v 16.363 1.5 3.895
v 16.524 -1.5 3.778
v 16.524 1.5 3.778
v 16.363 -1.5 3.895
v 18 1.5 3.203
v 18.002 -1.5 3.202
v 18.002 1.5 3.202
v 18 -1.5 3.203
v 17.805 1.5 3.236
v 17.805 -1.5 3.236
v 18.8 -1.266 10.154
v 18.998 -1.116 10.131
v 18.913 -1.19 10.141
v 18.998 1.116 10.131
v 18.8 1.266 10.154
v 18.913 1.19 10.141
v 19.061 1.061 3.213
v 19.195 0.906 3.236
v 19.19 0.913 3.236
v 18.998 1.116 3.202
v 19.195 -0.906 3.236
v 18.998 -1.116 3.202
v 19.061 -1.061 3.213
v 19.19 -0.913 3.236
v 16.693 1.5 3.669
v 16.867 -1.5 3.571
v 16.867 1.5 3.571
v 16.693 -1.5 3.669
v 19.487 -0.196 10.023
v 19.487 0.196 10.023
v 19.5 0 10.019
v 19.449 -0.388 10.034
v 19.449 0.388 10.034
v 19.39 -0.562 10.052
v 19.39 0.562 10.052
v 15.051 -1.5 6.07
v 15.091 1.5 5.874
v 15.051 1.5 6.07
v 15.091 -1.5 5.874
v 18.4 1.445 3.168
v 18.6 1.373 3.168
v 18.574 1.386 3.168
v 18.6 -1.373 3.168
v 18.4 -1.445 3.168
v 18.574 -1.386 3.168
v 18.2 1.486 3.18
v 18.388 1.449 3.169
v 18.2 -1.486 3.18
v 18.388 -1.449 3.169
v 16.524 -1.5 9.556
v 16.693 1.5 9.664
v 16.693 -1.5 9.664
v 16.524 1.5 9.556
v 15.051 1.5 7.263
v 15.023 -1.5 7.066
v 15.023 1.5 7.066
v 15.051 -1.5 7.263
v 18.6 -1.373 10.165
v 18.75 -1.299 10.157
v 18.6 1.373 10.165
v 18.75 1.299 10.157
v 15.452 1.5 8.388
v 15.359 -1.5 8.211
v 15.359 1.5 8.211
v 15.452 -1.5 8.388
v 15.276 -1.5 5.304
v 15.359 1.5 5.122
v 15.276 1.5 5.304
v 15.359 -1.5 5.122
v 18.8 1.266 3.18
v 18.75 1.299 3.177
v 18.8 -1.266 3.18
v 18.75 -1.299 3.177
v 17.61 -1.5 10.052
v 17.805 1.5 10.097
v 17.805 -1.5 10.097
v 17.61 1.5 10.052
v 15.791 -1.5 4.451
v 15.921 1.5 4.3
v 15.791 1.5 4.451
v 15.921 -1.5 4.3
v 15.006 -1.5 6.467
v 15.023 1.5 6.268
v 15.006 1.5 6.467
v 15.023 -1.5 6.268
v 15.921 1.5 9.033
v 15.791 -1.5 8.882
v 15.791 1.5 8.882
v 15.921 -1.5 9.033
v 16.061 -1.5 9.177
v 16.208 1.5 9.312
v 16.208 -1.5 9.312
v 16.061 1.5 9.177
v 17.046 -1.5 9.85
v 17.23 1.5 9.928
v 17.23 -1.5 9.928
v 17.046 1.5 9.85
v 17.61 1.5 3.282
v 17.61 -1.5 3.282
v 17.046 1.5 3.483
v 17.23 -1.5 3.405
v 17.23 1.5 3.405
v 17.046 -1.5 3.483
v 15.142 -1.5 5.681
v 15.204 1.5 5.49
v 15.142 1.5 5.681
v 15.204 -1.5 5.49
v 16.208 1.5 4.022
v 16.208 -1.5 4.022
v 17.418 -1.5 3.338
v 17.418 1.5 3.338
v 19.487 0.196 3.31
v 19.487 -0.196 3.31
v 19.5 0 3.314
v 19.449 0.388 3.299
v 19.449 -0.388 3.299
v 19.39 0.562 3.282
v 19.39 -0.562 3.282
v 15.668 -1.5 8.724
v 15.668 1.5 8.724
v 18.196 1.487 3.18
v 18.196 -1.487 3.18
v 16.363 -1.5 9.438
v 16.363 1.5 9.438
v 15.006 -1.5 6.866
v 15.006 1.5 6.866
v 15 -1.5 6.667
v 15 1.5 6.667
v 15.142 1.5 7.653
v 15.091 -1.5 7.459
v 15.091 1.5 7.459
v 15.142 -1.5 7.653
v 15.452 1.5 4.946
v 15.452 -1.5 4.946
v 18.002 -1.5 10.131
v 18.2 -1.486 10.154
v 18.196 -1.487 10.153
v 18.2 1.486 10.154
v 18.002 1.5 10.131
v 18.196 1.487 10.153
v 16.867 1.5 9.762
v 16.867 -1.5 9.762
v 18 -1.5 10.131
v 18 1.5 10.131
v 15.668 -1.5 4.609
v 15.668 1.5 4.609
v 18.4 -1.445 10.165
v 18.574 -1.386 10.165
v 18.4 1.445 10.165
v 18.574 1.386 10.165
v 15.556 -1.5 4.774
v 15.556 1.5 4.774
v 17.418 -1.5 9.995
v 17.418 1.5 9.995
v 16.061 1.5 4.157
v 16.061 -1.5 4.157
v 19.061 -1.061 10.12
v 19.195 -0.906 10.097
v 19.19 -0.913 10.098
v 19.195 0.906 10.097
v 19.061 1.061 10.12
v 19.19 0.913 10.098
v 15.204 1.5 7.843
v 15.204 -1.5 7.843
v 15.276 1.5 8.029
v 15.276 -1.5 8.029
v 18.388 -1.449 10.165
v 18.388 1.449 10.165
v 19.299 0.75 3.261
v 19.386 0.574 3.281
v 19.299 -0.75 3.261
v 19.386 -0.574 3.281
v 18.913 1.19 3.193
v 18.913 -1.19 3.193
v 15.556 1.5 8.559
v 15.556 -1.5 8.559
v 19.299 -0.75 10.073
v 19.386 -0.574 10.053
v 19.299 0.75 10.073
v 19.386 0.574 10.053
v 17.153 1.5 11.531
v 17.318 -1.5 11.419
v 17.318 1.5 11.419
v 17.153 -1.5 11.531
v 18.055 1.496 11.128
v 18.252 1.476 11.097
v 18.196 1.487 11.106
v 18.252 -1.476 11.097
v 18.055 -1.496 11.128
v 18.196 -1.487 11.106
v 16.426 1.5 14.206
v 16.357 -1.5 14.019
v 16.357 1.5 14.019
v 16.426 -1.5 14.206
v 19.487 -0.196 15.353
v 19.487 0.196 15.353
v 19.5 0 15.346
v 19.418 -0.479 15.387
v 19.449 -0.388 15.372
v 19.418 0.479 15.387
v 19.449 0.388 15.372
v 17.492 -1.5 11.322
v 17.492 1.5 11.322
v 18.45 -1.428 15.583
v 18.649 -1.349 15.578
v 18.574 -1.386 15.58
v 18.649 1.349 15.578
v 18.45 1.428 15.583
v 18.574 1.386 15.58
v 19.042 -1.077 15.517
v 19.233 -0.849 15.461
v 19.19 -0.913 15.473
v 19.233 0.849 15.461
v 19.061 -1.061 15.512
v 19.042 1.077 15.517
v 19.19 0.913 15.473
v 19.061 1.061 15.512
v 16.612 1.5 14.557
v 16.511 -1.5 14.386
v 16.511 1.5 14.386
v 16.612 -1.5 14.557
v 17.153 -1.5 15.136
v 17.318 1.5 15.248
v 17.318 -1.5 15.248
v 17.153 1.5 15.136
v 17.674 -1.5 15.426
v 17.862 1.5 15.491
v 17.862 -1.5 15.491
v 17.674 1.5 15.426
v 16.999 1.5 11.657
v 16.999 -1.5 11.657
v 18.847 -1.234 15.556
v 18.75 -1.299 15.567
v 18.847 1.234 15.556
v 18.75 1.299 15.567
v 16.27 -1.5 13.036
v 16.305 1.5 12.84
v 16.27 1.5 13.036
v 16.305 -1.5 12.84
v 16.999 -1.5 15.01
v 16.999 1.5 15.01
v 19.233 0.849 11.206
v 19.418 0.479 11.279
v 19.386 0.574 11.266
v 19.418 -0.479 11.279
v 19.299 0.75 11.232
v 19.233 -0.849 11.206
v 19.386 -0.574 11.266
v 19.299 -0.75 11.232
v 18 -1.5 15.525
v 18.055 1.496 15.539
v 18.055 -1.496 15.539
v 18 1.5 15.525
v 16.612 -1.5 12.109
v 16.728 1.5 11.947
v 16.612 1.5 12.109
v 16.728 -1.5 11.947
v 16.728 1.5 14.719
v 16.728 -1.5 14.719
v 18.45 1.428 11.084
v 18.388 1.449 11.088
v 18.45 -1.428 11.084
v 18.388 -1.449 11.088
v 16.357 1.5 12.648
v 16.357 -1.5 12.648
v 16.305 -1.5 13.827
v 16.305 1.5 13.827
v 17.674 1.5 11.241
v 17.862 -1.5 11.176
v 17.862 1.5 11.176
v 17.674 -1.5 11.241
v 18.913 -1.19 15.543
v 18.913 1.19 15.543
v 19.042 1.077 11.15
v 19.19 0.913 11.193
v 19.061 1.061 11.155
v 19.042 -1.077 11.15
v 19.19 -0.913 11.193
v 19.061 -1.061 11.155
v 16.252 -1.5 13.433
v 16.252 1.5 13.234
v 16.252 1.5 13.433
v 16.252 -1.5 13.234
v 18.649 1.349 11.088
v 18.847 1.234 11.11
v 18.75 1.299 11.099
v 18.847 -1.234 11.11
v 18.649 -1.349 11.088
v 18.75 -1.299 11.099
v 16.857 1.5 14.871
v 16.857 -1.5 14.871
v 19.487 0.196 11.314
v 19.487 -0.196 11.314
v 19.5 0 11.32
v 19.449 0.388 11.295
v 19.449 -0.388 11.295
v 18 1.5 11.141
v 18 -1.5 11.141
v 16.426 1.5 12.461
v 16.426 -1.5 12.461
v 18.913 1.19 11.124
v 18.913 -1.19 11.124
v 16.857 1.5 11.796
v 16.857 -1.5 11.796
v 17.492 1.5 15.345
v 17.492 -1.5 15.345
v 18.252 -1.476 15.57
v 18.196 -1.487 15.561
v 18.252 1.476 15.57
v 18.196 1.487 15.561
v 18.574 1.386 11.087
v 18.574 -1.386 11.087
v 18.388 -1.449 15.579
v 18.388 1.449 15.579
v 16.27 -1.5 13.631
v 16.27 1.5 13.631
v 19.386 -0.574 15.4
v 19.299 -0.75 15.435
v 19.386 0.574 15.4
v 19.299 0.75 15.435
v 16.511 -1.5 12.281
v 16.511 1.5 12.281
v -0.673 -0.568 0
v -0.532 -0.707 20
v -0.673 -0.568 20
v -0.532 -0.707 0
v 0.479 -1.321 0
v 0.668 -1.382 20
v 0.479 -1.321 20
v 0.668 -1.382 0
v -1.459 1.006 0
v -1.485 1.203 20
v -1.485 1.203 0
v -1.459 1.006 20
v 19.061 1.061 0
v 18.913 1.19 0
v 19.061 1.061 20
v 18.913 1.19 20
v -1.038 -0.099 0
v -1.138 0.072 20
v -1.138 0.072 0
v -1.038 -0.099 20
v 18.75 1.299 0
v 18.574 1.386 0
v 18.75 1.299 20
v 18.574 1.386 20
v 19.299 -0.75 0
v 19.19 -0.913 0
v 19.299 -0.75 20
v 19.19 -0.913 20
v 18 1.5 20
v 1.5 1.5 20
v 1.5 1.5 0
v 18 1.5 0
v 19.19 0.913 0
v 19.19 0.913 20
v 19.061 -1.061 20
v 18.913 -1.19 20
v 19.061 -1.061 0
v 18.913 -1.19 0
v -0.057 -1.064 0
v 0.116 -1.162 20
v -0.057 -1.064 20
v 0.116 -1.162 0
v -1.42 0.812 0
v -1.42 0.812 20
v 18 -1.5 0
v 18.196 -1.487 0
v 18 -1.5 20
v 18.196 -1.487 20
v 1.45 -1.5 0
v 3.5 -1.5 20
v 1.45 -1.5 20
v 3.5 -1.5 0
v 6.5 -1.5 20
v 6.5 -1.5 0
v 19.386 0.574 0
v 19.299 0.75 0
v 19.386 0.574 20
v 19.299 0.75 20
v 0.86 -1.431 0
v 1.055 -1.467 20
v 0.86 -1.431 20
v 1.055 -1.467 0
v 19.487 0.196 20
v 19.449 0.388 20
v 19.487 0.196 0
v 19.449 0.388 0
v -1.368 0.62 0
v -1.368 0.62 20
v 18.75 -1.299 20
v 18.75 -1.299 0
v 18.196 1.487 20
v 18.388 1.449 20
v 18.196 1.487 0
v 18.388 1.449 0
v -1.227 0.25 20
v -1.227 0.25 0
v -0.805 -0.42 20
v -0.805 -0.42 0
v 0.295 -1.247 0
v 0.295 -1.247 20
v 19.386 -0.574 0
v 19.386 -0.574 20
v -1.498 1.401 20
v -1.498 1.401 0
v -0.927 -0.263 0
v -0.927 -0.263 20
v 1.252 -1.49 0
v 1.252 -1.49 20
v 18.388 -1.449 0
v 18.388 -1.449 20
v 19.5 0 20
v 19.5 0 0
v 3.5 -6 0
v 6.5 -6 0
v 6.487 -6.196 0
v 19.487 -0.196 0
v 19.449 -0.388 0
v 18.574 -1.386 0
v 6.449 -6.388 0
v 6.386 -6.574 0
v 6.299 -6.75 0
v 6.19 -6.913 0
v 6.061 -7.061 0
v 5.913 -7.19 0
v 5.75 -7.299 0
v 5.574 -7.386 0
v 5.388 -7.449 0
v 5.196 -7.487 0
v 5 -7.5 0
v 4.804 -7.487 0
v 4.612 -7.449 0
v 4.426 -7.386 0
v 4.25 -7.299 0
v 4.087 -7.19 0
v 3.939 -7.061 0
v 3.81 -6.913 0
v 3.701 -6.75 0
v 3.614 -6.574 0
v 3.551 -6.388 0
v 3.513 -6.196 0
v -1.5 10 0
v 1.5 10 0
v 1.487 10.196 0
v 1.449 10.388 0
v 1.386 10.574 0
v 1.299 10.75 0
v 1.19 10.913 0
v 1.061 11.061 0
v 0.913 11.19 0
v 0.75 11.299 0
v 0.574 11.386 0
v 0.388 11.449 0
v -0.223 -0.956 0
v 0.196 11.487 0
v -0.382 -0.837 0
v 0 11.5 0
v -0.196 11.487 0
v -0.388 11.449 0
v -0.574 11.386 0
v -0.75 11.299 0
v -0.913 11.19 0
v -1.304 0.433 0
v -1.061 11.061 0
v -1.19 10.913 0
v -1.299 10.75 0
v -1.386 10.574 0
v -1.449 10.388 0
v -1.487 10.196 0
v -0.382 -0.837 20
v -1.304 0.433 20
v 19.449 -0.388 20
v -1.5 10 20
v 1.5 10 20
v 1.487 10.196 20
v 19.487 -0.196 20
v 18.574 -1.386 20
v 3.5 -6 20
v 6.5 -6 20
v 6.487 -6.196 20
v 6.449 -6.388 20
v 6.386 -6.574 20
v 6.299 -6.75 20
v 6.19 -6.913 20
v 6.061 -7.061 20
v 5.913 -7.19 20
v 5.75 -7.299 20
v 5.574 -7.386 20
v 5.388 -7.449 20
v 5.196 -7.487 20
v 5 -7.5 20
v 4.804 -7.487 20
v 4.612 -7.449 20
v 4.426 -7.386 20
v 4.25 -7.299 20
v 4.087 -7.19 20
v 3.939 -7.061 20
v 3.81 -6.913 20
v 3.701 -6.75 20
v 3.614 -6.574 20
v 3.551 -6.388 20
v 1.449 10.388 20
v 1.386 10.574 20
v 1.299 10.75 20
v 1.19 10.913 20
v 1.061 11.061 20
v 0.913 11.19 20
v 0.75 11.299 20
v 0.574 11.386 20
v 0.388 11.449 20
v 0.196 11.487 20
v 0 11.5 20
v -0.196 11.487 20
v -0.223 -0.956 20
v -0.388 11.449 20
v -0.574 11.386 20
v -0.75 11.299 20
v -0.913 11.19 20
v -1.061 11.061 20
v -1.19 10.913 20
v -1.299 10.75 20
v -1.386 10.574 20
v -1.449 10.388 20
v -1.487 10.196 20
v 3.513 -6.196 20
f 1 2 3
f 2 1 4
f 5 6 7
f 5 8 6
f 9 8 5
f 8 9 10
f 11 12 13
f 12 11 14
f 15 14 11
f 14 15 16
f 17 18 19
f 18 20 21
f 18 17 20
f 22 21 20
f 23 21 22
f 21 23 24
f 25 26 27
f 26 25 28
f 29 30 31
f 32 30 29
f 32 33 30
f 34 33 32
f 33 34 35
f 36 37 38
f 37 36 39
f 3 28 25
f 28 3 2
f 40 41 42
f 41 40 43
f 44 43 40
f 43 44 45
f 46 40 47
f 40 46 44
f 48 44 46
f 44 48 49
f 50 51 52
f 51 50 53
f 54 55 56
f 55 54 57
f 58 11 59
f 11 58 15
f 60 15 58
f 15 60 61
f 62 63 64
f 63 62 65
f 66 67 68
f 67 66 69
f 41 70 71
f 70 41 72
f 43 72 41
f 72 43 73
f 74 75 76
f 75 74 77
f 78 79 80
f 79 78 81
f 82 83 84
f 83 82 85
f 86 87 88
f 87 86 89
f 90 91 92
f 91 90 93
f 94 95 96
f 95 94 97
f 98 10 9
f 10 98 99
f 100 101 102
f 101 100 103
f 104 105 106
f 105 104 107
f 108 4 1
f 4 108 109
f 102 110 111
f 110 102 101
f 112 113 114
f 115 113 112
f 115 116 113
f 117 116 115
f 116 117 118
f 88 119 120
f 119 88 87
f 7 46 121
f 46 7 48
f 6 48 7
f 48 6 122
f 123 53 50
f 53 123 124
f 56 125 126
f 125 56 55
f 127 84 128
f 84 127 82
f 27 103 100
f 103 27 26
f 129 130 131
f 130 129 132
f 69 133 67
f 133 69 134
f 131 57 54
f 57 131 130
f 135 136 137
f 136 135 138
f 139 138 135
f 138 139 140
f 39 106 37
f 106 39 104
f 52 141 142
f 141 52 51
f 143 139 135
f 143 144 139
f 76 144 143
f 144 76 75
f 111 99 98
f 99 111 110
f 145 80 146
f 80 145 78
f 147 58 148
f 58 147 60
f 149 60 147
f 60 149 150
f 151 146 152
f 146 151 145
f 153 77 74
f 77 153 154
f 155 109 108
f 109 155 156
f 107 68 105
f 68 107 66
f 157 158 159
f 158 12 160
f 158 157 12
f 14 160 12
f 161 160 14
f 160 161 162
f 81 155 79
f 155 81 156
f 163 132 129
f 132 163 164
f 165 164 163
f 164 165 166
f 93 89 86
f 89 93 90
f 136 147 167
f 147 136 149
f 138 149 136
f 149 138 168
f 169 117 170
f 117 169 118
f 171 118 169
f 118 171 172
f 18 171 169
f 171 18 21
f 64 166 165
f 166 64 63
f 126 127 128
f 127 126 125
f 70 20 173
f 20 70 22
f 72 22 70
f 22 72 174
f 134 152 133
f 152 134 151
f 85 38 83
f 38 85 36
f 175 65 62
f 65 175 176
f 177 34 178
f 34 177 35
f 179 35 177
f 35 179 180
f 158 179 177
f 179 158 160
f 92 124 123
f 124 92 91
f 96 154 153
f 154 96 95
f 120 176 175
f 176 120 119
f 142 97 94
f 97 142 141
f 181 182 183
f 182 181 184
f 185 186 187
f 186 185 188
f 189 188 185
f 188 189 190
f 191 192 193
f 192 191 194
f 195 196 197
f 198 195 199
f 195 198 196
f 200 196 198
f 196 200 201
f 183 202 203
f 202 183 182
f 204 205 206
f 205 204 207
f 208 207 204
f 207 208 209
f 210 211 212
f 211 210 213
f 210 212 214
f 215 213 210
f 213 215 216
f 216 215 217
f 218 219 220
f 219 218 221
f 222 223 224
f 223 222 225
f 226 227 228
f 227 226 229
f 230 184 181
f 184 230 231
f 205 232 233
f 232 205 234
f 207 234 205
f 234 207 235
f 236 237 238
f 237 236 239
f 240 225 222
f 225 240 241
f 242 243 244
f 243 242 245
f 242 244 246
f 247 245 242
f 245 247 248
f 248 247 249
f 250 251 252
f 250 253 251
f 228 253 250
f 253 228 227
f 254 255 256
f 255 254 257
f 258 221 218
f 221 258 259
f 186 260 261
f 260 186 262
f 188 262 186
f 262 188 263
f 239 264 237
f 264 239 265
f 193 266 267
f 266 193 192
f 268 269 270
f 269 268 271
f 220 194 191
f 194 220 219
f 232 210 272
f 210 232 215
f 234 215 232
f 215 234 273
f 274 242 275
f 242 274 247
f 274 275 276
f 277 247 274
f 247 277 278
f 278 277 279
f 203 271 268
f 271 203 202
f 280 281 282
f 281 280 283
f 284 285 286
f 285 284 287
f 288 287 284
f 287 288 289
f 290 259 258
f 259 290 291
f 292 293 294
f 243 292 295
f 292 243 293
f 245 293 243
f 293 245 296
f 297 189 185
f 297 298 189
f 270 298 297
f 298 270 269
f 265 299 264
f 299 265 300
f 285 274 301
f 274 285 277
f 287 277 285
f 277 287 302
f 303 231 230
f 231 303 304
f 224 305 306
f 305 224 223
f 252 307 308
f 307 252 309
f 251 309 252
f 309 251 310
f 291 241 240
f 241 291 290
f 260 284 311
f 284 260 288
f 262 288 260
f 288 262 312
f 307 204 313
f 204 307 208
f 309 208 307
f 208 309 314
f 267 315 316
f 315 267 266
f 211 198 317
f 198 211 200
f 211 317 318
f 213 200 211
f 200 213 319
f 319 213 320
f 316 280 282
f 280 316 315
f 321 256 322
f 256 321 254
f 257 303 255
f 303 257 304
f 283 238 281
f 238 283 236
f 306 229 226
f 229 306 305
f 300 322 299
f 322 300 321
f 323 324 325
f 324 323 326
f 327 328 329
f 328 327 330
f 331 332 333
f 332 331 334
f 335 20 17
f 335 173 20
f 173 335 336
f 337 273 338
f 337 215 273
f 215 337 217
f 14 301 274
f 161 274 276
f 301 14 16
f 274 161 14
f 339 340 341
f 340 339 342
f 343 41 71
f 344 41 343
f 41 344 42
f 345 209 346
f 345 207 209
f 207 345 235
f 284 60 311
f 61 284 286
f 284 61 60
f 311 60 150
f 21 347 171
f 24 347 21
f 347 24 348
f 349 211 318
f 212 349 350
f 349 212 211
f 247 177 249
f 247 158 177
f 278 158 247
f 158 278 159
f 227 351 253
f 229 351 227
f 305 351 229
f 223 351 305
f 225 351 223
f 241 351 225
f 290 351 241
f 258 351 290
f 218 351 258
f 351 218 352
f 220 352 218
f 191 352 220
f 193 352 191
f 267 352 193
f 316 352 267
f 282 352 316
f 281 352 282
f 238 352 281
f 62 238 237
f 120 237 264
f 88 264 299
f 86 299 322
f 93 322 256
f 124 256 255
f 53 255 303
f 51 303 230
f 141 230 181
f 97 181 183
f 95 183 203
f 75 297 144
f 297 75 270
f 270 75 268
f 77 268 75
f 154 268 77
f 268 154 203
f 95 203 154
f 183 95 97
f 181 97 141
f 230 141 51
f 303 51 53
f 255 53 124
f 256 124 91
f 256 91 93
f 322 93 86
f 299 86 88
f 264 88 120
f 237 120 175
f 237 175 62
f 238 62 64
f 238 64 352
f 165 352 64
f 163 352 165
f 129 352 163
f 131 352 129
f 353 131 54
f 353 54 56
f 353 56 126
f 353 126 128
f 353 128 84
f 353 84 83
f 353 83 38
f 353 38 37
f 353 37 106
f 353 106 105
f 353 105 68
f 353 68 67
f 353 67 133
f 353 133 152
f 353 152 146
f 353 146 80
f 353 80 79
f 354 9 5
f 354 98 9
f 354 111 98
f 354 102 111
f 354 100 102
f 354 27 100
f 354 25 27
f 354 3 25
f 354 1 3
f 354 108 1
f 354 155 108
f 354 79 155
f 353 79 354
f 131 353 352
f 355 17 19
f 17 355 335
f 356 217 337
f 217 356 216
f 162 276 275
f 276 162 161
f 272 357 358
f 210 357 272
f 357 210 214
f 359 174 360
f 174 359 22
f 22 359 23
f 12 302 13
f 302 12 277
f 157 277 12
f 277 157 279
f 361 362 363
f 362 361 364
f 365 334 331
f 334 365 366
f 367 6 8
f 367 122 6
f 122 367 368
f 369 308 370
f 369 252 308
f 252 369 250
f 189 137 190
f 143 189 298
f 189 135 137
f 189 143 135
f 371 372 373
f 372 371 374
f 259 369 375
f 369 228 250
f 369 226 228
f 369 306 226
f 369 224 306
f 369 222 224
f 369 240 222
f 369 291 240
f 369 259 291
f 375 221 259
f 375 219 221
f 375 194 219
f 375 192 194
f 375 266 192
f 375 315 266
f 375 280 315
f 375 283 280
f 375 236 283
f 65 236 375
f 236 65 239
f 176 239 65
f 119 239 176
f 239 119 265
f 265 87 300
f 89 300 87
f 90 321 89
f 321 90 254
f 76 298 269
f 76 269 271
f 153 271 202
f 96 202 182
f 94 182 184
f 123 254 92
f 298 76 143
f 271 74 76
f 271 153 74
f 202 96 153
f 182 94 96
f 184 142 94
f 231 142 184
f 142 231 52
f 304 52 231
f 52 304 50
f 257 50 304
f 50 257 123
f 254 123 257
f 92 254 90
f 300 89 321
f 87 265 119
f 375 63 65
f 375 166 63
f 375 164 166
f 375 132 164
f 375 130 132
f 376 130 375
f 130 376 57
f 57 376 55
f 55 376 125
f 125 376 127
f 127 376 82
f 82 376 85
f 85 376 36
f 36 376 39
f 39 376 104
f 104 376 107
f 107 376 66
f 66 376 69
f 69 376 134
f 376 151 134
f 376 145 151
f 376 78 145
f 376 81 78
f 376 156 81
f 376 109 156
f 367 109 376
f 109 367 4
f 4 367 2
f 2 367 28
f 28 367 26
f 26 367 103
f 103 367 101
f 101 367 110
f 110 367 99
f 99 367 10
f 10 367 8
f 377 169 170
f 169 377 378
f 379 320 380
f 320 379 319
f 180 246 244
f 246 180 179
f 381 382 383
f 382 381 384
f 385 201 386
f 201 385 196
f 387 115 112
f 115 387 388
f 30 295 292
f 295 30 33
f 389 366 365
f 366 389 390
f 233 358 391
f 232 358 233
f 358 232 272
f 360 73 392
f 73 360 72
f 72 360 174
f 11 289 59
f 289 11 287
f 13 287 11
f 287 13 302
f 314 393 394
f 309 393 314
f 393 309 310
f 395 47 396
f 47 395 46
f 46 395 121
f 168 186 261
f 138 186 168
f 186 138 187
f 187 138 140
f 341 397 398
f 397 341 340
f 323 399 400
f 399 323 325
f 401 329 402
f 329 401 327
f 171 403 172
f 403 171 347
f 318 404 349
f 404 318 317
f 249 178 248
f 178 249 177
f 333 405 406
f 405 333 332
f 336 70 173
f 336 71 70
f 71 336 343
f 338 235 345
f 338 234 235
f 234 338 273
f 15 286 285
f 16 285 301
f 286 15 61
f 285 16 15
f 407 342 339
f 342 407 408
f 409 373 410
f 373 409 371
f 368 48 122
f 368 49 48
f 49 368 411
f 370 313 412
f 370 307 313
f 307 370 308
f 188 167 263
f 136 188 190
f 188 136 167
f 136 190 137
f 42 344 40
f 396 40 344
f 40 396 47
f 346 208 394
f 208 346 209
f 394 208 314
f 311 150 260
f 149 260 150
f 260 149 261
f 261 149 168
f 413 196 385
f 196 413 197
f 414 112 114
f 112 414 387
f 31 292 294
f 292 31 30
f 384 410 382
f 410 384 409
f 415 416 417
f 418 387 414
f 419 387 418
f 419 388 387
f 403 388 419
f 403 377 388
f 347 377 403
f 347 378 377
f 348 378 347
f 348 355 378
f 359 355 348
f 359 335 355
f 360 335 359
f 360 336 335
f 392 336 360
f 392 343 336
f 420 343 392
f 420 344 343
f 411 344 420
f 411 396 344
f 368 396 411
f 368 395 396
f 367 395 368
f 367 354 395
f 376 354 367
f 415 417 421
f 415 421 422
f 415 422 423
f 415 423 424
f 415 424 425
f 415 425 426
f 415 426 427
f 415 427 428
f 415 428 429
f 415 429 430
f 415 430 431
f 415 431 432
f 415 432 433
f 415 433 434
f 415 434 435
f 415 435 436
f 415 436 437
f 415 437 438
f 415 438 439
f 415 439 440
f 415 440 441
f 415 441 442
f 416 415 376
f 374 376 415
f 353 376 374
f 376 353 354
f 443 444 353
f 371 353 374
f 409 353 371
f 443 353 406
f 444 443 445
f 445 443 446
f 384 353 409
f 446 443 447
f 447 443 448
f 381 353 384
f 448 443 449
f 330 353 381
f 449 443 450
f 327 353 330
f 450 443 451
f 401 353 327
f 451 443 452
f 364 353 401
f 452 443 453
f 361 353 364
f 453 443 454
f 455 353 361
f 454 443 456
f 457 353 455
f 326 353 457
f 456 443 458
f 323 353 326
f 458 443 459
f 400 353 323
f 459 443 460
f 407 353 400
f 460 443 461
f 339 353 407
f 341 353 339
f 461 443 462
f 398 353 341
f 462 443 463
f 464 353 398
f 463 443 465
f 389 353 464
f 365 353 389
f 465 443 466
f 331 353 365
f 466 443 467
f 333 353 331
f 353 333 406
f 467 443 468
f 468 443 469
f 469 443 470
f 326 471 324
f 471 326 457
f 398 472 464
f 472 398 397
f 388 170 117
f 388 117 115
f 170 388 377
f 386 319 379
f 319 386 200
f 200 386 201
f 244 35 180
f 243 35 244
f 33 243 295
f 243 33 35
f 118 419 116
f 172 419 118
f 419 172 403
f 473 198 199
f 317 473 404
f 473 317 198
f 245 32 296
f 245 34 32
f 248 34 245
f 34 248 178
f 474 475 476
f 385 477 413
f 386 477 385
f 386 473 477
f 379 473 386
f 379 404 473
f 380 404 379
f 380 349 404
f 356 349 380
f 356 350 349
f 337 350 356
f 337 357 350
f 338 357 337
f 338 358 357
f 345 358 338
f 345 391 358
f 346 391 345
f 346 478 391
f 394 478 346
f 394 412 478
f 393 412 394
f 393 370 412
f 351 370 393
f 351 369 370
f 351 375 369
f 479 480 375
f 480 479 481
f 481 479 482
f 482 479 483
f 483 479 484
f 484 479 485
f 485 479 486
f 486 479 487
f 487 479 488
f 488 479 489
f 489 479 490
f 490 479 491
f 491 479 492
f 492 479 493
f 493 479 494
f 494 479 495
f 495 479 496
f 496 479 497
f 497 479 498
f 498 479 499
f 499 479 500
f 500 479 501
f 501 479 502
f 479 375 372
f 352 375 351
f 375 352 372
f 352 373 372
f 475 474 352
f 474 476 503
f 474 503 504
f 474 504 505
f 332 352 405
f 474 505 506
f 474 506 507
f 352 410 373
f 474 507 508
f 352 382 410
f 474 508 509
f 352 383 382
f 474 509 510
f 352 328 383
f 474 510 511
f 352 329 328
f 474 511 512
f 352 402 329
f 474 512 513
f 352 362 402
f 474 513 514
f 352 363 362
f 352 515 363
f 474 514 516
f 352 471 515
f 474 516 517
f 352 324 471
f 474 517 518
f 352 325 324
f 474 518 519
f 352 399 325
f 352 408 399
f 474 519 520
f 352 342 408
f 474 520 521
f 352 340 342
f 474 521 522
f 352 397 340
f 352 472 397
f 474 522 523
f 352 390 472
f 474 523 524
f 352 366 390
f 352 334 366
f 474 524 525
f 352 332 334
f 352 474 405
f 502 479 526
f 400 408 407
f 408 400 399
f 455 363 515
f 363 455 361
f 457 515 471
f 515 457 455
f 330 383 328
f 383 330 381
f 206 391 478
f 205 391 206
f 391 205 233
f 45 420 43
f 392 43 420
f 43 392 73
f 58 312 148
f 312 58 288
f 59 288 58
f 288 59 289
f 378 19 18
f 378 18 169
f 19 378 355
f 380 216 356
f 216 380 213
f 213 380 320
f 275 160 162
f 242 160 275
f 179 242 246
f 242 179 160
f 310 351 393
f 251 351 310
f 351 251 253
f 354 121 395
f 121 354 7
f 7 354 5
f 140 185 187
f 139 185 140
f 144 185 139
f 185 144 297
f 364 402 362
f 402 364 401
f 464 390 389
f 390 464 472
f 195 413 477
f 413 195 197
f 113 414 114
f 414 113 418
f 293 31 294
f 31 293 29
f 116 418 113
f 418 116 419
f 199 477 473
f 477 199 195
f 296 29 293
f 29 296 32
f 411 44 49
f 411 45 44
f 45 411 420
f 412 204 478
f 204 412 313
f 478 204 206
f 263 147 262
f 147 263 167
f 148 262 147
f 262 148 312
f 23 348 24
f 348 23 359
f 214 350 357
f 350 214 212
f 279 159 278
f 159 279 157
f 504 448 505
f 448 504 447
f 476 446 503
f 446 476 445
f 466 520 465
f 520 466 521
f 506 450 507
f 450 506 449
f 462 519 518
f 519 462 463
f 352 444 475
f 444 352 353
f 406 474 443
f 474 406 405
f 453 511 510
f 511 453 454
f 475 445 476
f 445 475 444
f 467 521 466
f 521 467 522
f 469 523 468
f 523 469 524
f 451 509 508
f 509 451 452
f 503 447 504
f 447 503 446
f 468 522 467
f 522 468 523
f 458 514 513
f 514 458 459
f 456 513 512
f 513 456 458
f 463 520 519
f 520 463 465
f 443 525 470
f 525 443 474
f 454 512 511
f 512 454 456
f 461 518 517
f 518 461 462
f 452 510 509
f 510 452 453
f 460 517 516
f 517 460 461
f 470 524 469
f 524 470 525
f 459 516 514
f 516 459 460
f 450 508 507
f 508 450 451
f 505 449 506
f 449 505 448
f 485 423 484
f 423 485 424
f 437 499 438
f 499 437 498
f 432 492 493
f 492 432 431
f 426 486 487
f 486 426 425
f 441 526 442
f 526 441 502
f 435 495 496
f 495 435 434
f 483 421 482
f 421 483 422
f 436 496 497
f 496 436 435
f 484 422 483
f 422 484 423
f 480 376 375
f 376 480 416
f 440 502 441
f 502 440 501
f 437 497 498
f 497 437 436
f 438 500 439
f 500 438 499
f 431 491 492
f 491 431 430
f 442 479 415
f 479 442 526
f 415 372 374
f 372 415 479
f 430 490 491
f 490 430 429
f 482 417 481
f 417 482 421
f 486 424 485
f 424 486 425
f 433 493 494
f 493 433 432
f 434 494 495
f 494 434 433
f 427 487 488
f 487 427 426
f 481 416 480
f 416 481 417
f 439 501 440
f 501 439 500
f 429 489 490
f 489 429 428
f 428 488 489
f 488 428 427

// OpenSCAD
//Settings.
width = 20;
length = 15;
thickness = 3;
back_hook_length = 10;
down_hook_length = 6;
steel_thickness = 2;
cable1_radius = 6.2 / 2 + 0.4; //Some extra play.
cable2_radius = 3.7 / 2 + 0.4;
$fs = 0.2;
$fa = 1;

module corner() {
	cylinder(r = thickness / 2, h=width);
}
module spaced_corner() {
	intersection() {
		translate([thickness / 2, thickness / 2, 0]) {
			cylinder(r = thickness, h=width);
		}
		translate([-thickness / 2, -thickness / 2, 0]) {
			cube([thickness, thickness, width]);
		}
	}
}

hull() {
	spaced_corner();
	translate([0, back_hook_length, 0]) {
		corner();
	}
}
difference() {
	hull() {
		spaced_corner();
		translate([length + thickness, 0, 0]) {
			corner();
		}
	}
	translate([length + thickness / 2 + steel_thickness, -thickness / 2 - 1, 0]) {
		rotate([-90, 0, 0]) {
			translate([0, -width / 3, 0]) {
				cylinder(r=cable1_radius, h=thickness + 2);
			}
			translate([0, -width * 2 / 3, 0]) {
				cylinder(r=cable2_radius, h=thickness + 2);
			}
		}
	}
}
translate([thickness + steel_thickness, 0, 0]) {
	hull() {
		corner();
		translate([0, -down_hook_length, 0]) {
			corner();
		}
	}
}
